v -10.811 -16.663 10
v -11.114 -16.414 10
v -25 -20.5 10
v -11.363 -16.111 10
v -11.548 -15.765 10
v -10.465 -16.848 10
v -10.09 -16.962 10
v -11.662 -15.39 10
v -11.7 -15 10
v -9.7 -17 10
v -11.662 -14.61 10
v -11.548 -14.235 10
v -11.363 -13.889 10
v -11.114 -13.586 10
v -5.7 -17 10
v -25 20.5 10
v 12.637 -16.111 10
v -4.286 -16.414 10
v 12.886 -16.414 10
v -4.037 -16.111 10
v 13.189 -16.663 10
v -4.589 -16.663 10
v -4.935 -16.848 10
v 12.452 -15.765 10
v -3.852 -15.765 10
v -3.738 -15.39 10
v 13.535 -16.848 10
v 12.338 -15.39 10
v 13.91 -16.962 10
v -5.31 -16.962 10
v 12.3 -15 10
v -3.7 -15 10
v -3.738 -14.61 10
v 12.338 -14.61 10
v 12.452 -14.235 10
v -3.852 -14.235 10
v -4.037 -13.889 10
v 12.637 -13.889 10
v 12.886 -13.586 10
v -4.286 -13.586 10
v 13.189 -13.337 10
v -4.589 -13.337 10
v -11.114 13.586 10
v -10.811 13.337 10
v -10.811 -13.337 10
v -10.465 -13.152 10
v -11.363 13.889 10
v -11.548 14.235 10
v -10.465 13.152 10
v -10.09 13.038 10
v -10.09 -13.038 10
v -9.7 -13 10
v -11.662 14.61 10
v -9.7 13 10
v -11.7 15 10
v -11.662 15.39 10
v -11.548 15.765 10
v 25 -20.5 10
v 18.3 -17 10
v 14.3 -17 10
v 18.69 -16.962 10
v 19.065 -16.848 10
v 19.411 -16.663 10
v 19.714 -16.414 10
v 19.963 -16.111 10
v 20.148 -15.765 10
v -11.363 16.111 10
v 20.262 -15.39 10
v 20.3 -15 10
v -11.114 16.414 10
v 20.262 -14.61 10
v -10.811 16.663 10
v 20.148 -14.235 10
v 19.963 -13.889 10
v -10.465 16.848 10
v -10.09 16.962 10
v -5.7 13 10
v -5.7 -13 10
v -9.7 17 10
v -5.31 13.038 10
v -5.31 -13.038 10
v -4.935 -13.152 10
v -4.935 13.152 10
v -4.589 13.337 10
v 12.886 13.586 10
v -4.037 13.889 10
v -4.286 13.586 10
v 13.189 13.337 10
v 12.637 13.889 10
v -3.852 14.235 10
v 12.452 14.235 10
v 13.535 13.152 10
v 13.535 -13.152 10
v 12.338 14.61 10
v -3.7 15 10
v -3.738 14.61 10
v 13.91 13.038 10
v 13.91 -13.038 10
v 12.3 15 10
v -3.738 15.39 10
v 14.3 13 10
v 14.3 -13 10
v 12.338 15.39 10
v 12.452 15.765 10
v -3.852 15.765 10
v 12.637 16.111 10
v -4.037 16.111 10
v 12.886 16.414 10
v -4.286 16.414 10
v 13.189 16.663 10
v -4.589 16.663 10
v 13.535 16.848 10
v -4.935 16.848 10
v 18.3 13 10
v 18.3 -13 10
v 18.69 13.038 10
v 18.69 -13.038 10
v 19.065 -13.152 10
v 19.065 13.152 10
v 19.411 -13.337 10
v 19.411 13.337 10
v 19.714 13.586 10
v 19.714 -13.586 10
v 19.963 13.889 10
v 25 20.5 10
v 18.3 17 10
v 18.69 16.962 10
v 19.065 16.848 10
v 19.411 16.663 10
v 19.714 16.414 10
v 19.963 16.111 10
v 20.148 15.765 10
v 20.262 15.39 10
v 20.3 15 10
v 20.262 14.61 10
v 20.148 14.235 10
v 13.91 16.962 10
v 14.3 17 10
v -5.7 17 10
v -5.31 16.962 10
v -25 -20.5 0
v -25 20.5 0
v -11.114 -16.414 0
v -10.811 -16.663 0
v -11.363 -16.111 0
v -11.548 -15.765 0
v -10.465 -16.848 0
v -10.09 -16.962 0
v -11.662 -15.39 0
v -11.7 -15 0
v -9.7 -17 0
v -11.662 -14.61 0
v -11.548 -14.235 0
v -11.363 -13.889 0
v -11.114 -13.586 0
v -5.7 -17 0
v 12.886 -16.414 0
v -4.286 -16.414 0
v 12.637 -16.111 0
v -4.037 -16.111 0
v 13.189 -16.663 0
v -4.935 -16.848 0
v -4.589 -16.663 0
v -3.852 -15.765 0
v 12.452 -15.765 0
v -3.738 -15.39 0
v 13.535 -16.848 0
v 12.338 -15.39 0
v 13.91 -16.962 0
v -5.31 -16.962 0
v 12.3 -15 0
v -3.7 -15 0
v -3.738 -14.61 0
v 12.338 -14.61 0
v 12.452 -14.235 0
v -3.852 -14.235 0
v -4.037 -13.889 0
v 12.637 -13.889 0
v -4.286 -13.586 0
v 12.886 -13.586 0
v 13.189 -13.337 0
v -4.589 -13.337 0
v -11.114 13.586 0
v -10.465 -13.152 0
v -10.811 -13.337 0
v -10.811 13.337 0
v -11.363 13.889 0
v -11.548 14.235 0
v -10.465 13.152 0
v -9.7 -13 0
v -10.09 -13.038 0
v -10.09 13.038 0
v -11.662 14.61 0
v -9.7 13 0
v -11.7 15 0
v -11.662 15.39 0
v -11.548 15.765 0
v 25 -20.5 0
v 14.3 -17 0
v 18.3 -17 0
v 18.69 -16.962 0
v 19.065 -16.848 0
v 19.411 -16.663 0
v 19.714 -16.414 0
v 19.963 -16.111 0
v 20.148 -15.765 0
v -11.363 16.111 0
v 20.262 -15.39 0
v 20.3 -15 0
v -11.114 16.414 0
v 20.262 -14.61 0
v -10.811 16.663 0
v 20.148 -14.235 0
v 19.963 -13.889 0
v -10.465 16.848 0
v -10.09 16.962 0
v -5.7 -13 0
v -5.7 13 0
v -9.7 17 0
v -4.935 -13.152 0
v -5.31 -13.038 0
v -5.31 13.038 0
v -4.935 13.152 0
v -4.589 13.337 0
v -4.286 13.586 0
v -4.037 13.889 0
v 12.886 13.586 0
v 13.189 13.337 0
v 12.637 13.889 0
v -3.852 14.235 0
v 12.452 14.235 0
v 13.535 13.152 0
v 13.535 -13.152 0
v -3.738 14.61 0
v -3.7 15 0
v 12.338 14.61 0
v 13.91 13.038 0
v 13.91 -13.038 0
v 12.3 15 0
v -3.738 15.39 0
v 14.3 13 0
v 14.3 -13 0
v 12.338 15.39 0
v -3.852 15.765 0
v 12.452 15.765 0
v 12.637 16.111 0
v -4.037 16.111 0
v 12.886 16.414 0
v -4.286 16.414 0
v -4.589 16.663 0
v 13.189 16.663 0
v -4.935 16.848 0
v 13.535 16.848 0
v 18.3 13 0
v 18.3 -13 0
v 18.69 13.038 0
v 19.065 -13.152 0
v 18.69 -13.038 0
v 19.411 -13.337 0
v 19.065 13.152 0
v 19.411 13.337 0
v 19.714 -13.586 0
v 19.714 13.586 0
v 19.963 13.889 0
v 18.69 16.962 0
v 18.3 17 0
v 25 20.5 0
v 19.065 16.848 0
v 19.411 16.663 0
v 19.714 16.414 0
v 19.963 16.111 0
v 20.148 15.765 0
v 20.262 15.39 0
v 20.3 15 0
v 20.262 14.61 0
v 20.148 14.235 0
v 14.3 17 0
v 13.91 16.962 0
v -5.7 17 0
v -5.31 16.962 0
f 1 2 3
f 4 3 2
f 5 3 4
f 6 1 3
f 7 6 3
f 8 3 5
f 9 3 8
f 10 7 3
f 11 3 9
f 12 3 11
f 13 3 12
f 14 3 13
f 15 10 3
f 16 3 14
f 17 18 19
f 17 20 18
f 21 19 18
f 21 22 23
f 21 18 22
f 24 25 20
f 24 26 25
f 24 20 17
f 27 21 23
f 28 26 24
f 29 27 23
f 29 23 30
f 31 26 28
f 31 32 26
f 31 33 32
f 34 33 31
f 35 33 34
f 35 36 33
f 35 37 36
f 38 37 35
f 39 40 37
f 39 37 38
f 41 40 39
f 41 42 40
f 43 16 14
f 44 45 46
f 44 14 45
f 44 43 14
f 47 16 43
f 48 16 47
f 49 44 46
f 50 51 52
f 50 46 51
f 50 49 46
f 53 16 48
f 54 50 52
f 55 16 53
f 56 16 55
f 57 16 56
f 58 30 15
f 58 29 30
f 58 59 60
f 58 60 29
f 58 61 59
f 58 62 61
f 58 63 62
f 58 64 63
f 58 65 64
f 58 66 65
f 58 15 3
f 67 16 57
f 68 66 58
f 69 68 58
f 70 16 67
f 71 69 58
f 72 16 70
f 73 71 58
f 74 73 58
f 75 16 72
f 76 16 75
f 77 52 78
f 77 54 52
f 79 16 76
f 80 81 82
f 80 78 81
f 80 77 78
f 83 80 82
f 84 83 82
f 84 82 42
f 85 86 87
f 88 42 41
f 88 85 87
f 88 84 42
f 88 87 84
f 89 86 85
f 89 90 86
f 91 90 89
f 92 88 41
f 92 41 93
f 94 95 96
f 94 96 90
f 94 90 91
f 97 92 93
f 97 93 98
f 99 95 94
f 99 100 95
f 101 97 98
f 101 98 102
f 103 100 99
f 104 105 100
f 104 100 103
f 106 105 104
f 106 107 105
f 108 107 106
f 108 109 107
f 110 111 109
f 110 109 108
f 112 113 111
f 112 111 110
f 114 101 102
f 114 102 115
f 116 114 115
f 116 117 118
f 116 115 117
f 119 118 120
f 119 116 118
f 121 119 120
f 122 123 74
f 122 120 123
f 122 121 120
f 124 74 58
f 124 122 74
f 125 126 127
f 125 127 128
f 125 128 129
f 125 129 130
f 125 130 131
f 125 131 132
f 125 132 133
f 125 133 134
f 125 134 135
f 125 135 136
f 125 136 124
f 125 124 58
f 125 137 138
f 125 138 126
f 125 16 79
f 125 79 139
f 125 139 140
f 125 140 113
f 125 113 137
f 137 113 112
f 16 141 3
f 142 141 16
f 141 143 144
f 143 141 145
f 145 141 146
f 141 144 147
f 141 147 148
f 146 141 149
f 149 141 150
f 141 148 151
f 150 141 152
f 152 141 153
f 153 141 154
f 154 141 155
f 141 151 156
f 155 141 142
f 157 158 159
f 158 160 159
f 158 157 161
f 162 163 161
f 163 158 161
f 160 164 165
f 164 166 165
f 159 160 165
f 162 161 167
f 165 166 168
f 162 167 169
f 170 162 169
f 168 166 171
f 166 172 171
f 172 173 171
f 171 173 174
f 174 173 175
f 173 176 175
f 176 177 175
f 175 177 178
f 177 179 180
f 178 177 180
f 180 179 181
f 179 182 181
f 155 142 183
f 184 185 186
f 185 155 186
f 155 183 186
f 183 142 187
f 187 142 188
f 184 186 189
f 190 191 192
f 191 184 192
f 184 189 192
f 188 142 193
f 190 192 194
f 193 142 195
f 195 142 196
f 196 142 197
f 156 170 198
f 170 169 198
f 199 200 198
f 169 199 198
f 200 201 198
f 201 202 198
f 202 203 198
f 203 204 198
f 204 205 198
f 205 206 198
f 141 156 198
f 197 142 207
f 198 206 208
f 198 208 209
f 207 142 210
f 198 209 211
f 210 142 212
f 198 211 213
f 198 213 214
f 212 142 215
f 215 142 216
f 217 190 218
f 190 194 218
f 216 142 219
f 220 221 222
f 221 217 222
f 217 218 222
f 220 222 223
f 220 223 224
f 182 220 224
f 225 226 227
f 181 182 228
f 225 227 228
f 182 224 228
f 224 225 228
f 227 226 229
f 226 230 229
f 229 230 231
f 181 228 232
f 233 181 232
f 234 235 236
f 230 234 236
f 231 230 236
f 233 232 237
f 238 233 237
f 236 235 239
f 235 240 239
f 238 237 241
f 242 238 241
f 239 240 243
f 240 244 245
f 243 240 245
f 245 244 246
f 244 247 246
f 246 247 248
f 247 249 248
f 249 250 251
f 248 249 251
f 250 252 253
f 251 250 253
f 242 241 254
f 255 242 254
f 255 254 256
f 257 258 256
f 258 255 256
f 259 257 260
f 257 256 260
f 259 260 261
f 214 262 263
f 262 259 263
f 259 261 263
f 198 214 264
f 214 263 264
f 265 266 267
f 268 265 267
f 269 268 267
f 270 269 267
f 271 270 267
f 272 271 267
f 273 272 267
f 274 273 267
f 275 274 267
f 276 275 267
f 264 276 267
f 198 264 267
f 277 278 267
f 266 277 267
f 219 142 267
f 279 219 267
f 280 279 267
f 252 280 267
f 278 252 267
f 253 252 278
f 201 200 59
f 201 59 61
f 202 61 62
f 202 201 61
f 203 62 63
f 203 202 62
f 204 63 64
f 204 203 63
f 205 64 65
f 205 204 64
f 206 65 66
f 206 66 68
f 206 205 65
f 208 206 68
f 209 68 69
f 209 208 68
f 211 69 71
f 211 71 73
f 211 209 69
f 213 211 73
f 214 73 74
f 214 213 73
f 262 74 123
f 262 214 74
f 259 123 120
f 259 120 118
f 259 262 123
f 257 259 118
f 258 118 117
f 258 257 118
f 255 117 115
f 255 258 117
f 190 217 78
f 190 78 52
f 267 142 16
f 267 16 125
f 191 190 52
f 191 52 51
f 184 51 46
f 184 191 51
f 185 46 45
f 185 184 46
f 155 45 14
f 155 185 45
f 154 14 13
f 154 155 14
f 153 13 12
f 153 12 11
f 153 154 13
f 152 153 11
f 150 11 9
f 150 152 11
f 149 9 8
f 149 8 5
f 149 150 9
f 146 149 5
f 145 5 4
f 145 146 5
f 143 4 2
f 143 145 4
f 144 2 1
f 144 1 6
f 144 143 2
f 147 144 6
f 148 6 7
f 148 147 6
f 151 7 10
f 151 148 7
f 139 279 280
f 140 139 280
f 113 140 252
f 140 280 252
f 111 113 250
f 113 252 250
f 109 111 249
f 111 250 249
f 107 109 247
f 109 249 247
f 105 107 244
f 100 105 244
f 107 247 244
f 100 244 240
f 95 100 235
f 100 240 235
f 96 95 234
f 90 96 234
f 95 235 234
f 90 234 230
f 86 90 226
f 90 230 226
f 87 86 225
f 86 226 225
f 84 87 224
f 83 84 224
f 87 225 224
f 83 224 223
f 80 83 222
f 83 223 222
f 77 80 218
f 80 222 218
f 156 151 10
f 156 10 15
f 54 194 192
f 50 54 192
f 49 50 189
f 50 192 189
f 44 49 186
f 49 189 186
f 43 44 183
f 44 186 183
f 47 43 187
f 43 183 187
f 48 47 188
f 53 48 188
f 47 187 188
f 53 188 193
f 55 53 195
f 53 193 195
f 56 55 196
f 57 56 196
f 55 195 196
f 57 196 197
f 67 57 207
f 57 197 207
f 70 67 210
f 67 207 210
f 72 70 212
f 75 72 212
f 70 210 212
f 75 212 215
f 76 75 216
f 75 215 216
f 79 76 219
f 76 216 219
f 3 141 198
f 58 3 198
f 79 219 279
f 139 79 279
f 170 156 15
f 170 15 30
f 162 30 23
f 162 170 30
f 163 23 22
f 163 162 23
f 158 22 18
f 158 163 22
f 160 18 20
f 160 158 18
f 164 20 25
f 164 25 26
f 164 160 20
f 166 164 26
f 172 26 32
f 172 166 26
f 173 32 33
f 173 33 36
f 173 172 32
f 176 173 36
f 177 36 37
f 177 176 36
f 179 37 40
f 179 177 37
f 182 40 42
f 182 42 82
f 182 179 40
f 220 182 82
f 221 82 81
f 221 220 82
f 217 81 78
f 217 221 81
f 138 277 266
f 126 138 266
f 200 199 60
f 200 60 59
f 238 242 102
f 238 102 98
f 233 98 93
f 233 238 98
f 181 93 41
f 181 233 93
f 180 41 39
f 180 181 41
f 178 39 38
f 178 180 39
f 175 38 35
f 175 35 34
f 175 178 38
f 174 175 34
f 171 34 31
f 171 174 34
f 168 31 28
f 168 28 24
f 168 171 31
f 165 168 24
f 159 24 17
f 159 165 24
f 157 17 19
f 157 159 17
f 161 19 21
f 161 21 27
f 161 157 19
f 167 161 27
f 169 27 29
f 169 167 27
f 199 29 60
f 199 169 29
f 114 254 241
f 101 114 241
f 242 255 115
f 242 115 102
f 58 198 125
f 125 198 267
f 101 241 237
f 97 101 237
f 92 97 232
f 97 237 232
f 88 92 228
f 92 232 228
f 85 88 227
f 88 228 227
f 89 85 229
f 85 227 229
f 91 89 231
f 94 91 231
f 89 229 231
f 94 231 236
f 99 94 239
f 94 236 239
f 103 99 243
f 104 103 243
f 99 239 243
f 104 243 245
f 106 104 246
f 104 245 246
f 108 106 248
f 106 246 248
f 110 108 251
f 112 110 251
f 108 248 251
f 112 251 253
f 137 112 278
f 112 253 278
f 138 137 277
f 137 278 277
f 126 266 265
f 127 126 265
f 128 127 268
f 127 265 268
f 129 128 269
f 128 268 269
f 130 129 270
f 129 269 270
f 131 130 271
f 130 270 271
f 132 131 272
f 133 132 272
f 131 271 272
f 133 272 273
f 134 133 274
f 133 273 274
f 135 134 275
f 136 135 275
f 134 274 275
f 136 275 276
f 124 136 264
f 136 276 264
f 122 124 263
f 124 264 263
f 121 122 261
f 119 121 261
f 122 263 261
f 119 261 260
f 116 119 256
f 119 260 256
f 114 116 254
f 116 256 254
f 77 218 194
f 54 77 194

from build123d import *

# Parameters (mm, degrees)
SKETCH1_W           = 50
SKETCH1_H           = 41
BOSS_EXTRUDE1_DEPTH = 10
CUT_EXTRUDE1_DEPTH  = 10


with BuildPart() as part:
    # Sketch1 → Boss-Extrude1 (new body)
    with BuildSketch(Plane.XY):
        Rectangle(SKETCH1_W, SKETCH1_H)
    extrude(amount=BOSS_EXTRUDE1_DEPTH)

    # Sketch2 → Cut-Extrude1 (cut)
    with BuildSketch(Plane(origin=(0, 0, 0), x_dir=(-1, 0, 0), z_dir=(0, 0, -1))):
        with BuildLine():
            Line((9.7, -17), (5.7, -17))
            ThreePointArc((5.7, -17), (3.7, -15), (5.7, -13))
            Line((5.7, -13), (9.7, -13))
            ThreePointArc((9.7, -13), (11.7, -15), (9.7, -17))
        make_face()
        with BuildLine():
            Line((-14.3, -17), (-18.3, -17))
            ThreePointArc((-18.3, -17), (-20.3, -15), (-18.3, -13))
            Line((-18.3, -13), (-14.3, -13))
            ThreePointArc((-14.3, -13), (-12.3, -15), (-14.3, -17))
        make_face()
        with BuildLine():
            Line((5.7, 13), (9.7, 13))
            ThreePointArc((9.7, 13), (11.7, 15), (9.7, 17))
            Line((9.7, 17), (5.7, 17))
            ThreePointArc((5.7, 17), (3.7, 15), (5.7, 13))
        make_face()
        with BuildLine():
            Line((-18.3, 13), (-14.3, 13))
            ThreePointArc((-14.3, 13), (-12.3, 15), (-14.3, 17))
            Line((-14.3, 17), (-18.3, 17))
            ThreePointArc((-18.3, 17), (-20.3, 15), (-18.3, 13))
        make_face()
    extrude(amount=-CUT_EXTRUDE1_DEPTH, mode=Mode.SUBTRACT)


solid = part.part
